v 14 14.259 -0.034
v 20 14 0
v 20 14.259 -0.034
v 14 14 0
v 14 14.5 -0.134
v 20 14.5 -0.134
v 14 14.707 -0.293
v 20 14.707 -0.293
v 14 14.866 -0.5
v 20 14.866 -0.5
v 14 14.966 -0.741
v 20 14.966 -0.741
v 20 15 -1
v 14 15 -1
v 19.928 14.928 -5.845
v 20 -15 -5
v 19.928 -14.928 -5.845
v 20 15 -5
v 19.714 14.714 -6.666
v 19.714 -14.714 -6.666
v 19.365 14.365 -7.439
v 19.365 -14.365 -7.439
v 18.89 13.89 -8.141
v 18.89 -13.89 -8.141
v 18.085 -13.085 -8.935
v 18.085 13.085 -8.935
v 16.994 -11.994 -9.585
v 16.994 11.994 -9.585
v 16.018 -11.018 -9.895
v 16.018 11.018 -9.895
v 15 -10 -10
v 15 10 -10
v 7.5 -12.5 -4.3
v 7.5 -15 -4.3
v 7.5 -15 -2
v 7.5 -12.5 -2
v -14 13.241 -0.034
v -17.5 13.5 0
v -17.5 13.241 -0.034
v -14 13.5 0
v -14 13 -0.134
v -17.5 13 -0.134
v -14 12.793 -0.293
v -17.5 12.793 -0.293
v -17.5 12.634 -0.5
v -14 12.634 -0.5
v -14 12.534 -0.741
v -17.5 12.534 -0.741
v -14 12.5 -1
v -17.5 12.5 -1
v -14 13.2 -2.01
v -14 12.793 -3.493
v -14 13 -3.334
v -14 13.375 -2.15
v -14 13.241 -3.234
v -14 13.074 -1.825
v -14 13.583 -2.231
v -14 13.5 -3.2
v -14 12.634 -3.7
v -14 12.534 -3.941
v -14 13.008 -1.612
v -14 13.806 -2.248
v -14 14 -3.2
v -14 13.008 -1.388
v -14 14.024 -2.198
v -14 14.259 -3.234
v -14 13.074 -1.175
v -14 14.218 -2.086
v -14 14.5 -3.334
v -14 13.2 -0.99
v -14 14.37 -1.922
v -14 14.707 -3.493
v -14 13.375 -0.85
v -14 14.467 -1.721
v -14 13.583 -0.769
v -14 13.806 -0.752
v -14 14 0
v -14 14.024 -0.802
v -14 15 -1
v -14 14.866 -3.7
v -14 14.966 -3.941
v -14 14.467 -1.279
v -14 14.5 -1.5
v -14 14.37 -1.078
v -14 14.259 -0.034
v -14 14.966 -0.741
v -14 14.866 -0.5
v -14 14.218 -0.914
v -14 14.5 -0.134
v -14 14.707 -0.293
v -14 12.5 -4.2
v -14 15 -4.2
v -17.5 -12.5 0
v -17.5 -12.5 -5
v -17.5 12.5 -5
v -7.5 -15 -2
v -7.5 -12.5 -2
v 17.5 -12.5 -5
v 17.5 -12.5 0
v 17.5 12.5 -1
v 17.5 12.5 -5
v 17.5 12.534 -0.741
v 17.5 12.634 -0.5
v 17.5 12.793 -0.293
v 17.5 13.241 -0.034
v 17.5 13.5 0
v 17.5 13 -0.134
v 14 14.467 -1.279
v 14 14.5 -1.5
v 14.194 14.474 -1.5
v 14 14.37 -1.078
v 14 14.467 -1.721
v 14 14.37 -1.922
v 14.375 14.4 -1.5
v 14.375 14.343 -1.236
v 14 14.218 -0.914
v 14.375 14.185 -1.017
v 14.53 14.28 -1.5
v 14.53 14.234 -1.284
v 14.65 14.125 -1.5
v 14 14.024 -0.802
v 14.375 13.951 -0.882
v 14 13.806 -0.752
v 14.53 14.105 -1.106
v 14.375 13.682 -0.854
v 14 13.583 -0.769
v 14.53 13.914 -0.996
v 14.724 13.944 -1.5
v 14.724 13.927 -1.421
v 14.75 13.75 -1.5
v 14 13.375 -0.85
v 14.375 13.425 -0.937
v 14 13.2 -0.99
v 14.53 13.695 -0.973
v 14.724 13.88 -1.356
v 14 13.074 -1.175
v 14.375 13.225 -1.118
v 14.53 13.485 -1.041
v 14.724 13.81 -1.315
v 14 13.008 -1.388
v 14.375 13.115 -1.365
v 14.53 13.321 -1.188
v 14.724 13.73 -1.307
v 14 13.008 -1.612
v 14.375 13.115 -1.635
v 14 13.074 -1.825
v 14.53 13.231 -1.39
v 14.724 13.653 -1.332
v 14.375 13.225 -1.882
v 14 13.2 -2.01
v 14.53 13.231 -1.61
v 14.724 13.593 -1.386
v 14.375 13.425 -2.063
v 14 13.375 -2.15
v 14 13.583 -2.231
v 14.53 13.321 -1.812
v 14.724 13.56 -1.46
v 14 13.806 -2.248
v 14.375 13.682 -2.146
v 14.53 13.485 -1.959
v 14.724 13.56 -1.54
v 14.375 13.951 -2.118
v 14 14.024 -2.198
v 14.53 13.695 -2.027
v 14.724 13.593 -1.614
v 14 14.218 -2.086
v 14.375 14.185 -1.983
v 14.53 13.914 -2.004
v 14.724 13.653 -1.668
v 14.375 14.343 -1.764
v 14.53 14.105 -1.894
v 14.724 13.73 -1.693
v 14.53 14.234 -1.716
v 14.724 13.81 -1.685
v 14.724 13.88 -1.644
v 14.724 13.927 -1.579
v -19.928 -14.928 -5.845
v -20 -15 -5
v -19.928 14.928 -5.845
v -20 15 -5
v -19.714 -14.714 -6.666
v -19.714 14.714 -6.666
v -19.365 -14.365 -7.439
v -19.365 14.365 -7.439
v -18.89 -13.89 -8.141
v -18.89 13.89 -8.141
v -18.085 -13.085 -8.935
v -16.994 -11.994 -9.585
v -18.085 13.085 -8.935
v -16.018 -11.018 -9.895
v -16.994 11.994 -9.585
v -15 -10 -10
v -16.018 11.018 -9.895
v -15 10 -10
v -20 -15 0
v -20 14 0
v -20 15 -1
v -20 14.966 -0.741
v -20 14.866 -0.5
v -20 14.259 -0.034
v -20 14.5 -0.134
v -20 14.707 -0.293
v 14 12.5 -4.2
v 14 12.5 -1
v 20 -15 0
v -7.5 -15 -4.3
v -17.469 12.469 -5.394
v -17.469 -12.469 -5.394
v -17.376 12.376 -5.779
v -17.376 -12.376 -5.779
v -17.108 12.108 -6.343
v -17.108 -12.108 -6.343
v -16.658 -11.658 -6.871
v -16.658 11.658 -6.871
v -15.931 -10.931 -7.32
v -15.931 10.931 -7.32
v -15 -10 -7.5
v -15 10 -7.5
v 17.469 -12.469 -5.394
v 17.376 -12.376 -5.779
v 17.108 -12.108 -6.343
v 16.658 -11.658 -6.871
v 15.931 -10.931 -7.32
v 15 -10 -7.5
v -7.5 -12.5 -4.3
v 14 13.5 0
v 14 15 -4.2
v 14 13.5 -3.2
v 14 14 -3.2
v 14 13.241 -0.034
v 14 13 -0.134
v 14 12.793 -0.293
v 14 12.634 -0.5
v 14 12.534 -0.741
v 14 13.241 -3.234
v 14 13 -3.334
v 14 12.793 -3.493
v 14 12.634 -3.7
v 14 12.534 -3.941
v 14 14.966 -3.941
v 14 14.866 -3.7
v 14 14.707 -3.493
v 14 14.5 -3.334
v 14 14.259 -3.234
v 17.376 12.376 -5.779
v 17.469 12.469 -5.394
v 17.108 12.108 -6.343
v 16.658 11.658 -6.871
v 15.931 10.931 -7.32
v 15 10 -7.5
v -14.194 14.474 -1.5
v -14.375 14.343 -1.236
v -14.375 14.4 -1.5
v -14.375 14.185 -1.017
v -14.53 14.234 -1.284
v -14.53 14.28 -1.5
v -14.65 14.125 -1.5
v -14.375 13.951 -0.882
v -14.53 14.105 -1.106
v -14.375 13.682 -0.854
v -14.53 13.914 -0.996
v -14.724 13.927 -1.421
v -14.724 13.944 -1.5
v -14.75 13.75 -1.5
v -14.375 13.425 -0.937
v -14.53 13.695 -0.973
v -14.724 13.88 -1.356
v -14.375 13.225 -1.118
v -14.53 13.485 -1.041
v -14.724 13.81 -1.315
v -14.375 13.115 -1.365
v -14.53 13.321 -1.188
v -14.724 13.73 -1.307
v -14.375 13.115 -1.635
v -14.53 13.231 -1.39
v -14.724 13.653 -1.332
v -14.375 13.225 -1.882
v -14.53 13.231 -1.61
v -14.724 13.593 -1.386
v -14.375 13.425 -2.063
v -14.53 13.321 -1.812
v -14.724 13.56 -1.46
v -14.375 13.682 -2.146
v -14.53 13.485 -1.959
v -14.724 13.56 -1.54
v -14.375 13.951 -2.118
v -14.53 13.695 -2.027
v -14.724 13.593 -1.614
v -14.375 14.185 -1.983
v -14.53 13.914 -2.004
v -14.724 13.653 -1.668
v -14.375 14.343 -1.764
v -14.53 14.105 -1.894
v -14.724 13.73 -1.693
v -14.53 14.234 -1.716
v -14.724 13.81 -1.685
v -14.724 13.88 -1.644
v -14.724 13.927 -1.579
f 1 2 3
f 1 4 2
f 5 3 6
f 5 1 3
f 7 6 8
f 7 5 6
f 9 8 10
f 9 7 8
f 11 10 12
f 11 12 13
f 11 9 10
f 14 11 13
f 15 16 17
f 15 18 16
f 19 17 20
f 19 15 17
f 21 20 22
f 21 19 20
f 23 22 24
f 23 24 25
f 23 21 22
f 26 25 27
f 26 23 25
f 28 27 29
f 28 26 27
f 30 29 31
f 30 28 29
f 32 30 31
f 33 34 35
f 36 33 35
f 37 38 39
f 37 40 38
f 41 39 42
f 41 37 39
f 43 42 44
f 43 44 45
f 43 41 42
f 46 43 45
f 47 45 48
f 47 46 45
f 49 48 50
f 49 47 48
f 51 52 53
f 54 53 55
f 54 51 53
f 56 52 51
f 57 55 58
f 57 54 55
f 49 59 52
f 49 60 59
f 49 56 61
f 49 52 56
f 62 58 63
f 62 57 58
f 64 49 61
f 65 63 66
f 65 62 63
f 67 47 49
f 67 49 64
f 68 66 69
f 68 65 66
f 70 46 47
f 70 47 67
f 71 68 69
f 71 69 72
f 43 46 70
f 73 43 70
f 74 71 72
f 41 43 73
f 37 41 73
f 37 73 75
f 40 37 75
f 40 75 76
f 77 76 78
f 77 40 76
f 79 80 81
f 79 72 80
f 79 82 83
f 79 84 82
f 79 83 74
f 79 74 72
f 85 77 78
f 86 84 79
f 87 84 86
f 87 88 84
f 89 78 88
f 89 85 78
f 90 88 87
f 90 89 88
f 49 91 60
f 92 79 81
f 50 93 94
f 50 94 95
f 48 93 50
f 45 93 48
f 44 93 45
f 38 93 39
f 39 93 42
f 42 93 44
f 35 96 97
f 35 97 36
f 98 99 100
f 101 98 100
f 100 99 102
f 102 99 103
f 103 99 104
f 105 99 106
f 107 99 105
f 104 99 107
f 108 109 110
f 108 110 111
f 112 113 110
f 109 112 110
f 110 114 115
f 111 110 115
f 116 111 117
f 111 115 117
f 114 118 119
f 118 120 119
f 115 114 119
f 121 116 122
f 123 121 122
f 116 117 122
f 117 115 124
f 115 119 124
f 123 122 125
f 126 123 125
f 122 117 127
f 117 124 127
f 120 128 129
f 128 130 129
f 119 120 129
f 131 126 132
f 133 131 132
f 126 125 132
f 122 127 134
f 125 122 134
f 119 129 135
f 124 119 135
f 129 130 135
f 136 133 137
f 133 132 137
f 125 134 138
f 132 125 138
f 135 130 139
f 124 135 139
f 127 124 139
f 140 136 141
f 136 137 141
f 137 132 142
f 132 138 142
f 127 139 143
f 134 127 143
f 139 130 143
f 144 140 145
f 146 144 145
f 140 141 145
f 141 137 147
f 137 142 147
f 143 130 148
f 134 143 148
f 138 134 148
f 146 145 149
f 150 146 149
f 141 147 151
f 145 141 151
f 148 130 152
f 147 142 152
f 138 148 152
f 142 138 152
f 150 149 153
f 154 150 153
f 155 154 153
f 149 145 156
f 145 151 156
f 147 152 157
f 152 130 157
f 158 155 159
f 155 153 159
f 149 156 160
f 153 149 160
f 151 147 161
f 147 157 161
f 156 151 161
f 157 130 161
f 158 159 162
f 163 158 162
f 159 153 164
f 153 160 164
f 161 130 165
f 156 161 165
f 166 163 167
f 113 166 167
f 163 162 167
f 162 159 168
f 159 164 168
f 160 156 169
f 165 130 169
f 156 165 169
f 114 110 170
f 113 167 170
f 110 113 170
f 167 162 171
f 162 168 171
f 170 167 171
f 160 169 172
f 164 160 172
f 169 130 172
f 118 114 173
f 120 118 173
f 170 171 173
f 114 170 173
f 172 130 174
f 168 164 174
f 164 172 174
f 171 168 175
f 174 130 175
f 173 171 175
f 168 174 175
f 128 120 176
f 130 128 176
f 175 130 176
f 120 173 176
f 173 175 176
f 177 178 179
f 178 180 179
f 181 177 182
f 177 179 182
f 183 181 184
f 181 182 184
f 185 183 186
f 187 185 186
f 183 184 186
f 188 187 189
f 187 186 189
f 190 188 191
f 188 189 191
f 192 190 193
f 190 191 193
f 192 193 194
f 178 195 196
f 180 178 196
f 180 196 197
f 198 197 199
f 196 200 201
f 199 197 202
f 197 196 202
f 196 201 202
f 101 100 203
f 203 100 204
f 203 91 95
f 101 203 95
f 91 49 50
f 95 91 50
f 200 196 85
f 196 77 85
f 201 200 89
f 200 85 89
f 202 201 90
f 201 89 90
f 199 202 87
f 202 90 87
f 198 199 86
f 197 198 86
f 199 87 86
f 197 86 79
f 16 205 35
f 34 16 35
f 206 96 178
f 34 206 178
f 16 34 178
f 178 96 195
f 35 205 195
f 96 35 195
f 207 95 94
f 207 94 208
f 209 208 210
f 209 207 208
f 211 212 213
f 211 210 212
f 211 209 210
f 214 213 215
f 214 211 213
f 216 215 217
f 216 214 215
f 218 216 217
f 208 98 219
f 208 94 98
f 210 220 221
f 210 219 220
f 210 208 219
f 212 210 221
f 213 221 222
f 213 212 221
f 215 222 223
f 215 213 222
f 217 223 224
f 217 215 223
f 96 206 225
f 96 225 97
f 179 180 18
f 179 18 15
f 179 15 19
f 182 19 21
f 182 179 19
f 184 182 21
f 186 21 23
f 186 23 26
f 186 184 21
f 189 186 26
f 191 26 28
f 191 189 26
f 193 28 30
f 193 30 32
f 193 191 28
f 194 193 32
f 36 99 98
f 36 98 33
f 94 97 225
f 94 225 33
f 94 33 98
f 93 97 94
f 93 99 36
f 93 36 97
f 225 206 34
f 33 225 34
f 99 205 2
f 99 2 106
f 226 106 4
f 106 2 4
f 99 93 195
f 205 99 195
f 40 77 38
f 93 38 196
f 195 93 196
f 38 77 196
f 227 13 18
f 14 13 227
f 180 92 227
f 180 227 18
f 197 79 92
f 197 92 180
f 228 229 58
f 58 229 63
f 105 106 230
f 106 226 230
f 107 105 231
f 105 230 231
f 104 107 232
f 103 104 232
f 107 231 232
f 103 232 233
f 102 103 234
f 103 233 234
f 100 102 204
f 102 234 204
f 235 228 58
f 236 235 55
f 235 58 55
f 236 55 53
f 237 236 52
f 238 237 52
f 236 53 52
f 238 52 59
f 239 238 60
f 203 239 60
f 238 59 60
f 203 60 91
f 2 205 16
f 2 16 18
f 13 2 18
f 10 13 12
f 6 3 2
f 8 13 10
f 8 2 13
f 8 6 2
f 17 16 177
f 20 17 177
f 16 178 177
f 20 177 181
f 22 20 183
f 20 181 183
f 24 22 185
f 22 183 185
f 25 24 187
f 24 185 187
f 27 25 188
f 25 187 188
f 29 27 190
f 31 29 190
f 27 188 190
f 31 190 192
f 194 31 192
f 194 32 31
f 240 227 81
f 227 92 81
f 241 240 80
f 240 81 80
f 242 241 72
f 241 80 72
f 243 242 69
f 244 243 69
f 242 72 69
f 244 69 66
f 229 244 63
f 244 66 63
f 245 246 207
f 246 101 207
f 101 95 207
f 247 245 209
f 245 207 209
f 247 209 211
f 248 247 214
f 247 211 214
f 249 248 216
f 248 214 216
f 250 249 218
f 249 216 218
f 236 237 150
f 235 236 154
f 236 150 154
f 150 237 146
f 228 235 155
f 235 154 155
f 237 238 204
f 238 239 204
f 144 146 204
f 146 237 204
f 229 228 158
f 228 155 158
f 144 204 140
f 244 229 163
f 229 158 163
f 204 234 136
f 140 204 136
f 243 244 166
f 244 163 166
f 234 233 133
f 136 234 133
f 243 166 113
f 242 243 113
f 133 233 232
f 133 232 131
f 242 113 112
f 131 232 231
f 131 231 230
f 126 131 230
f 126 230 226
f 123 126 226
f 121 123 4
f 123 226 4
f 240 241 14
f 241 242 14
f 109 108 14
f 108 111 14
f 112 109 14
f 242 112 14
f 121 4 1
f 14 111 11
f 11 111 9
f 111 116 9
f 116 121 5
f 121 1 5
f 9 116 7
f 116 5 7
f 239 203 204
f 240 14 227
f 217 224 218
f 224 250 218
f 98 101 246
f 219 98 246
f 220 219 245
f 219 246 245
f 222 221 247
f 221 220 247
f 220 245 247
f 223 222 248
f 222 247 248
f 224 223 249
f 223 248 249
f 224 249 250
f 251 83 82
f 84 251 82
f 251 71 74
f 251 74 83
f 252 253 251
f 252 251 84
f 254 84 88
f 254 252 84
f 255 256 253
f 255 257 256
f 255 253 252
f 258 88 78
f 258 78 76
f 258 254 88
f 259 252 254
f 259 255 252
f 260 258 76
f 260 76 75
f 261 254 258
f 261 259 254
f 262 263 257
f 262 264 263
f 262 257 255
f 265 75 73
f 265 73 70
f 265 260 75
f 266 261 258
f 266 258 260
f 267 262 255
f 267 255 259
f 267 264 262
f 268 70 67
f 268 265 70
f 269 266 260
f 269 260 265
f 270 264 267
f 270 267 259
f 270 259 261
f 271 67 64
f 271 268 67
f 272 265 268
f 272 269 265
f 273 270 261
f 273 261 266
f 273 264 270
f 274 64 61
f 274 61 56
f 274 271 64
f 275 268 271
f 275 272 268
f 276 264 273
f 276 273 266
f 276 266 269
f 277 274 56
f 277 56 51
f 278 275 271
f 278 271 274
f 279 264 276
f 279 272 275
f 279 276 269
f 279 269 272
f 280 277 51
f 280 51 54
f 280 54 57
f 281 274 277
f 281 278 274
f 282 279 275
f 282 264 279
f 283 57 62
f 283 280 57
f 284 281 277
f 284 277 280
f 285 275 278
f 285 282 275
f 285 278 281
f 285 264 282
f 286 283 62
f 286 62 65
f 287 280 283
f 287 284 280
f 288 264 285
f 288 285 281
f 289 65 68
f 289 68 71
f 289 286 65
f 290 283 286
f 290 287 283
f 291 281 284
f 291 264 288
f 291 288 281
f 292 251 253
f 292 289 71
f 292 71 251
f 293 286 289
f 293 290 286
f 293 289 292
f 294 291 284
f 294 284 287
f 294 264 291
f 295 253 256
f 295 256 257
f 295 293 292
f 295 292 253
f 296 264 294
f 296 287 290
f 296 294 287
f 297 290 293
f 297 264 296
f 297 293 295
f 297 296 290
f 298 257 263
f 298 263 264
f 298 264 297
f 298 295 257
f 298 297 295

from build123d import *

# Parameters (mm, degrees)
F0_W      = 40
F0_H      = 30
F1_DEPTH  = 10
F2_R      = 5
F3_T      = -2.5
F4_W      = 28
F4_H      = 2.5
F5_DEPTH  = 3
F6_W      = 32.3581136763
F6_H      = 60.2468792349
F7_DEPTH  = 25
F8_R      = 0.75
F9_DEPTH  = 0.75
F10_R     = 0.74999
F11_W     = 14
F11_H     = 2.5
F12_DEPTH = 0.2
F13_R     = 1
F15_W     = 15
F15_H     = 2.3
F16_DEPTH = 2.5


# Not quite as in the source:
# - a fillet or chamfer is up to 0.001 mm smaller than in the source, because OpenCascade refuses the exact size


with BuildPart() as f1:
    # F0 (on Top) → F1 (new body)
    with BuildSketch(Plane.XY):
        Rectangle(F0_W, F0_H)
    extrude(amount=-F1_DEPTH)

    # F2
    f2_edges = [f1.edges().sort_by_distance(p)[0] for p in [
        (20, 0, -10),
        (0, 15, -10),
        (-20, 0, -10),
        (0, -15, -10),
    ]]
    fillet(f2_edges, radius=F2_R)

    # F3
    f3_openings = [f1.faces().sort_by_distance(p)[0] for p in [
        (0, 0, 0),
    ]]
    offset(amount=F3_T, openings=f3_openings)

    # F4 (on face) → F5 (cut)
    with BuildSketch(Plane.XY):
        with Locations((0, 13.75)):
            Rectangle(F4_W, F4_H)
    extrude(amount=-F5_DEPTH, mode=Mode.SUBTRACT)

    # F6 (on Top) → F7 (cut)
    with BuildSketch(Plane.XY):
        with Locations((16.1790568382, -2.0559011027)):
            Rectangle(F6_W, F6_H)
    extrude(amount=-F7_DEPTH, mode=Mode.SUBTRACT)

    # F8 (on face) → F9 (cut)
    with BuildSketch(Plane.YZ.offset(-14)):
        with Locations((13.75, -1.5)):
            Circle(F8_R)
    extrude(amount=-F9_DEPTH, mode=Mode.SUBTRACT)

    # F10 (radius 0.75 in the source; OpenCascade refuses exactly that, so slightly less here)
    f10_edges = [f1.edges().sort_by_distance(p)[0] for p in [
        (-14.75, 13, -1.5),
    ]]
    fillet(f10_edges, radius=F10_R)

    # F11 (on face) → F12 (cut)
    with BuildSketch(Plane.XY.offset(-3)):
        with Locations((-7, 13.75)):
            Rectangle(F11_W, F11_H)
    extrude(amount=-F12_DEPTH, mode=Mode.SUBTRACT)

    # F13
    f13_edges = [f1.edges().sort_by_distance(p)[0] for p in [
        (-17, 15, 0),
        (-15.75, 12.5, 0),
        (-7, 15, -3.2),
        (-7, 12.5, -3.2),
    ]]
    fillet(f13_edges, radius=F13_R)

    # F14: F1 across plane


with BuildPart() as f1_1:
    add(f1.part)
    add(f1.part.mirror(Plane.YZ))

    # F15 (on face) → F16 (cut, through all)
    with BuildSketch(Plane.XZ.offset(15)):
        with Locations((0, -3.15)):
            Rectangle(F15_W, F15_H)
    extrude(amount=-F16_DEPTH, mode=Mode.SUBTRACT)


solid = f1_1.part
